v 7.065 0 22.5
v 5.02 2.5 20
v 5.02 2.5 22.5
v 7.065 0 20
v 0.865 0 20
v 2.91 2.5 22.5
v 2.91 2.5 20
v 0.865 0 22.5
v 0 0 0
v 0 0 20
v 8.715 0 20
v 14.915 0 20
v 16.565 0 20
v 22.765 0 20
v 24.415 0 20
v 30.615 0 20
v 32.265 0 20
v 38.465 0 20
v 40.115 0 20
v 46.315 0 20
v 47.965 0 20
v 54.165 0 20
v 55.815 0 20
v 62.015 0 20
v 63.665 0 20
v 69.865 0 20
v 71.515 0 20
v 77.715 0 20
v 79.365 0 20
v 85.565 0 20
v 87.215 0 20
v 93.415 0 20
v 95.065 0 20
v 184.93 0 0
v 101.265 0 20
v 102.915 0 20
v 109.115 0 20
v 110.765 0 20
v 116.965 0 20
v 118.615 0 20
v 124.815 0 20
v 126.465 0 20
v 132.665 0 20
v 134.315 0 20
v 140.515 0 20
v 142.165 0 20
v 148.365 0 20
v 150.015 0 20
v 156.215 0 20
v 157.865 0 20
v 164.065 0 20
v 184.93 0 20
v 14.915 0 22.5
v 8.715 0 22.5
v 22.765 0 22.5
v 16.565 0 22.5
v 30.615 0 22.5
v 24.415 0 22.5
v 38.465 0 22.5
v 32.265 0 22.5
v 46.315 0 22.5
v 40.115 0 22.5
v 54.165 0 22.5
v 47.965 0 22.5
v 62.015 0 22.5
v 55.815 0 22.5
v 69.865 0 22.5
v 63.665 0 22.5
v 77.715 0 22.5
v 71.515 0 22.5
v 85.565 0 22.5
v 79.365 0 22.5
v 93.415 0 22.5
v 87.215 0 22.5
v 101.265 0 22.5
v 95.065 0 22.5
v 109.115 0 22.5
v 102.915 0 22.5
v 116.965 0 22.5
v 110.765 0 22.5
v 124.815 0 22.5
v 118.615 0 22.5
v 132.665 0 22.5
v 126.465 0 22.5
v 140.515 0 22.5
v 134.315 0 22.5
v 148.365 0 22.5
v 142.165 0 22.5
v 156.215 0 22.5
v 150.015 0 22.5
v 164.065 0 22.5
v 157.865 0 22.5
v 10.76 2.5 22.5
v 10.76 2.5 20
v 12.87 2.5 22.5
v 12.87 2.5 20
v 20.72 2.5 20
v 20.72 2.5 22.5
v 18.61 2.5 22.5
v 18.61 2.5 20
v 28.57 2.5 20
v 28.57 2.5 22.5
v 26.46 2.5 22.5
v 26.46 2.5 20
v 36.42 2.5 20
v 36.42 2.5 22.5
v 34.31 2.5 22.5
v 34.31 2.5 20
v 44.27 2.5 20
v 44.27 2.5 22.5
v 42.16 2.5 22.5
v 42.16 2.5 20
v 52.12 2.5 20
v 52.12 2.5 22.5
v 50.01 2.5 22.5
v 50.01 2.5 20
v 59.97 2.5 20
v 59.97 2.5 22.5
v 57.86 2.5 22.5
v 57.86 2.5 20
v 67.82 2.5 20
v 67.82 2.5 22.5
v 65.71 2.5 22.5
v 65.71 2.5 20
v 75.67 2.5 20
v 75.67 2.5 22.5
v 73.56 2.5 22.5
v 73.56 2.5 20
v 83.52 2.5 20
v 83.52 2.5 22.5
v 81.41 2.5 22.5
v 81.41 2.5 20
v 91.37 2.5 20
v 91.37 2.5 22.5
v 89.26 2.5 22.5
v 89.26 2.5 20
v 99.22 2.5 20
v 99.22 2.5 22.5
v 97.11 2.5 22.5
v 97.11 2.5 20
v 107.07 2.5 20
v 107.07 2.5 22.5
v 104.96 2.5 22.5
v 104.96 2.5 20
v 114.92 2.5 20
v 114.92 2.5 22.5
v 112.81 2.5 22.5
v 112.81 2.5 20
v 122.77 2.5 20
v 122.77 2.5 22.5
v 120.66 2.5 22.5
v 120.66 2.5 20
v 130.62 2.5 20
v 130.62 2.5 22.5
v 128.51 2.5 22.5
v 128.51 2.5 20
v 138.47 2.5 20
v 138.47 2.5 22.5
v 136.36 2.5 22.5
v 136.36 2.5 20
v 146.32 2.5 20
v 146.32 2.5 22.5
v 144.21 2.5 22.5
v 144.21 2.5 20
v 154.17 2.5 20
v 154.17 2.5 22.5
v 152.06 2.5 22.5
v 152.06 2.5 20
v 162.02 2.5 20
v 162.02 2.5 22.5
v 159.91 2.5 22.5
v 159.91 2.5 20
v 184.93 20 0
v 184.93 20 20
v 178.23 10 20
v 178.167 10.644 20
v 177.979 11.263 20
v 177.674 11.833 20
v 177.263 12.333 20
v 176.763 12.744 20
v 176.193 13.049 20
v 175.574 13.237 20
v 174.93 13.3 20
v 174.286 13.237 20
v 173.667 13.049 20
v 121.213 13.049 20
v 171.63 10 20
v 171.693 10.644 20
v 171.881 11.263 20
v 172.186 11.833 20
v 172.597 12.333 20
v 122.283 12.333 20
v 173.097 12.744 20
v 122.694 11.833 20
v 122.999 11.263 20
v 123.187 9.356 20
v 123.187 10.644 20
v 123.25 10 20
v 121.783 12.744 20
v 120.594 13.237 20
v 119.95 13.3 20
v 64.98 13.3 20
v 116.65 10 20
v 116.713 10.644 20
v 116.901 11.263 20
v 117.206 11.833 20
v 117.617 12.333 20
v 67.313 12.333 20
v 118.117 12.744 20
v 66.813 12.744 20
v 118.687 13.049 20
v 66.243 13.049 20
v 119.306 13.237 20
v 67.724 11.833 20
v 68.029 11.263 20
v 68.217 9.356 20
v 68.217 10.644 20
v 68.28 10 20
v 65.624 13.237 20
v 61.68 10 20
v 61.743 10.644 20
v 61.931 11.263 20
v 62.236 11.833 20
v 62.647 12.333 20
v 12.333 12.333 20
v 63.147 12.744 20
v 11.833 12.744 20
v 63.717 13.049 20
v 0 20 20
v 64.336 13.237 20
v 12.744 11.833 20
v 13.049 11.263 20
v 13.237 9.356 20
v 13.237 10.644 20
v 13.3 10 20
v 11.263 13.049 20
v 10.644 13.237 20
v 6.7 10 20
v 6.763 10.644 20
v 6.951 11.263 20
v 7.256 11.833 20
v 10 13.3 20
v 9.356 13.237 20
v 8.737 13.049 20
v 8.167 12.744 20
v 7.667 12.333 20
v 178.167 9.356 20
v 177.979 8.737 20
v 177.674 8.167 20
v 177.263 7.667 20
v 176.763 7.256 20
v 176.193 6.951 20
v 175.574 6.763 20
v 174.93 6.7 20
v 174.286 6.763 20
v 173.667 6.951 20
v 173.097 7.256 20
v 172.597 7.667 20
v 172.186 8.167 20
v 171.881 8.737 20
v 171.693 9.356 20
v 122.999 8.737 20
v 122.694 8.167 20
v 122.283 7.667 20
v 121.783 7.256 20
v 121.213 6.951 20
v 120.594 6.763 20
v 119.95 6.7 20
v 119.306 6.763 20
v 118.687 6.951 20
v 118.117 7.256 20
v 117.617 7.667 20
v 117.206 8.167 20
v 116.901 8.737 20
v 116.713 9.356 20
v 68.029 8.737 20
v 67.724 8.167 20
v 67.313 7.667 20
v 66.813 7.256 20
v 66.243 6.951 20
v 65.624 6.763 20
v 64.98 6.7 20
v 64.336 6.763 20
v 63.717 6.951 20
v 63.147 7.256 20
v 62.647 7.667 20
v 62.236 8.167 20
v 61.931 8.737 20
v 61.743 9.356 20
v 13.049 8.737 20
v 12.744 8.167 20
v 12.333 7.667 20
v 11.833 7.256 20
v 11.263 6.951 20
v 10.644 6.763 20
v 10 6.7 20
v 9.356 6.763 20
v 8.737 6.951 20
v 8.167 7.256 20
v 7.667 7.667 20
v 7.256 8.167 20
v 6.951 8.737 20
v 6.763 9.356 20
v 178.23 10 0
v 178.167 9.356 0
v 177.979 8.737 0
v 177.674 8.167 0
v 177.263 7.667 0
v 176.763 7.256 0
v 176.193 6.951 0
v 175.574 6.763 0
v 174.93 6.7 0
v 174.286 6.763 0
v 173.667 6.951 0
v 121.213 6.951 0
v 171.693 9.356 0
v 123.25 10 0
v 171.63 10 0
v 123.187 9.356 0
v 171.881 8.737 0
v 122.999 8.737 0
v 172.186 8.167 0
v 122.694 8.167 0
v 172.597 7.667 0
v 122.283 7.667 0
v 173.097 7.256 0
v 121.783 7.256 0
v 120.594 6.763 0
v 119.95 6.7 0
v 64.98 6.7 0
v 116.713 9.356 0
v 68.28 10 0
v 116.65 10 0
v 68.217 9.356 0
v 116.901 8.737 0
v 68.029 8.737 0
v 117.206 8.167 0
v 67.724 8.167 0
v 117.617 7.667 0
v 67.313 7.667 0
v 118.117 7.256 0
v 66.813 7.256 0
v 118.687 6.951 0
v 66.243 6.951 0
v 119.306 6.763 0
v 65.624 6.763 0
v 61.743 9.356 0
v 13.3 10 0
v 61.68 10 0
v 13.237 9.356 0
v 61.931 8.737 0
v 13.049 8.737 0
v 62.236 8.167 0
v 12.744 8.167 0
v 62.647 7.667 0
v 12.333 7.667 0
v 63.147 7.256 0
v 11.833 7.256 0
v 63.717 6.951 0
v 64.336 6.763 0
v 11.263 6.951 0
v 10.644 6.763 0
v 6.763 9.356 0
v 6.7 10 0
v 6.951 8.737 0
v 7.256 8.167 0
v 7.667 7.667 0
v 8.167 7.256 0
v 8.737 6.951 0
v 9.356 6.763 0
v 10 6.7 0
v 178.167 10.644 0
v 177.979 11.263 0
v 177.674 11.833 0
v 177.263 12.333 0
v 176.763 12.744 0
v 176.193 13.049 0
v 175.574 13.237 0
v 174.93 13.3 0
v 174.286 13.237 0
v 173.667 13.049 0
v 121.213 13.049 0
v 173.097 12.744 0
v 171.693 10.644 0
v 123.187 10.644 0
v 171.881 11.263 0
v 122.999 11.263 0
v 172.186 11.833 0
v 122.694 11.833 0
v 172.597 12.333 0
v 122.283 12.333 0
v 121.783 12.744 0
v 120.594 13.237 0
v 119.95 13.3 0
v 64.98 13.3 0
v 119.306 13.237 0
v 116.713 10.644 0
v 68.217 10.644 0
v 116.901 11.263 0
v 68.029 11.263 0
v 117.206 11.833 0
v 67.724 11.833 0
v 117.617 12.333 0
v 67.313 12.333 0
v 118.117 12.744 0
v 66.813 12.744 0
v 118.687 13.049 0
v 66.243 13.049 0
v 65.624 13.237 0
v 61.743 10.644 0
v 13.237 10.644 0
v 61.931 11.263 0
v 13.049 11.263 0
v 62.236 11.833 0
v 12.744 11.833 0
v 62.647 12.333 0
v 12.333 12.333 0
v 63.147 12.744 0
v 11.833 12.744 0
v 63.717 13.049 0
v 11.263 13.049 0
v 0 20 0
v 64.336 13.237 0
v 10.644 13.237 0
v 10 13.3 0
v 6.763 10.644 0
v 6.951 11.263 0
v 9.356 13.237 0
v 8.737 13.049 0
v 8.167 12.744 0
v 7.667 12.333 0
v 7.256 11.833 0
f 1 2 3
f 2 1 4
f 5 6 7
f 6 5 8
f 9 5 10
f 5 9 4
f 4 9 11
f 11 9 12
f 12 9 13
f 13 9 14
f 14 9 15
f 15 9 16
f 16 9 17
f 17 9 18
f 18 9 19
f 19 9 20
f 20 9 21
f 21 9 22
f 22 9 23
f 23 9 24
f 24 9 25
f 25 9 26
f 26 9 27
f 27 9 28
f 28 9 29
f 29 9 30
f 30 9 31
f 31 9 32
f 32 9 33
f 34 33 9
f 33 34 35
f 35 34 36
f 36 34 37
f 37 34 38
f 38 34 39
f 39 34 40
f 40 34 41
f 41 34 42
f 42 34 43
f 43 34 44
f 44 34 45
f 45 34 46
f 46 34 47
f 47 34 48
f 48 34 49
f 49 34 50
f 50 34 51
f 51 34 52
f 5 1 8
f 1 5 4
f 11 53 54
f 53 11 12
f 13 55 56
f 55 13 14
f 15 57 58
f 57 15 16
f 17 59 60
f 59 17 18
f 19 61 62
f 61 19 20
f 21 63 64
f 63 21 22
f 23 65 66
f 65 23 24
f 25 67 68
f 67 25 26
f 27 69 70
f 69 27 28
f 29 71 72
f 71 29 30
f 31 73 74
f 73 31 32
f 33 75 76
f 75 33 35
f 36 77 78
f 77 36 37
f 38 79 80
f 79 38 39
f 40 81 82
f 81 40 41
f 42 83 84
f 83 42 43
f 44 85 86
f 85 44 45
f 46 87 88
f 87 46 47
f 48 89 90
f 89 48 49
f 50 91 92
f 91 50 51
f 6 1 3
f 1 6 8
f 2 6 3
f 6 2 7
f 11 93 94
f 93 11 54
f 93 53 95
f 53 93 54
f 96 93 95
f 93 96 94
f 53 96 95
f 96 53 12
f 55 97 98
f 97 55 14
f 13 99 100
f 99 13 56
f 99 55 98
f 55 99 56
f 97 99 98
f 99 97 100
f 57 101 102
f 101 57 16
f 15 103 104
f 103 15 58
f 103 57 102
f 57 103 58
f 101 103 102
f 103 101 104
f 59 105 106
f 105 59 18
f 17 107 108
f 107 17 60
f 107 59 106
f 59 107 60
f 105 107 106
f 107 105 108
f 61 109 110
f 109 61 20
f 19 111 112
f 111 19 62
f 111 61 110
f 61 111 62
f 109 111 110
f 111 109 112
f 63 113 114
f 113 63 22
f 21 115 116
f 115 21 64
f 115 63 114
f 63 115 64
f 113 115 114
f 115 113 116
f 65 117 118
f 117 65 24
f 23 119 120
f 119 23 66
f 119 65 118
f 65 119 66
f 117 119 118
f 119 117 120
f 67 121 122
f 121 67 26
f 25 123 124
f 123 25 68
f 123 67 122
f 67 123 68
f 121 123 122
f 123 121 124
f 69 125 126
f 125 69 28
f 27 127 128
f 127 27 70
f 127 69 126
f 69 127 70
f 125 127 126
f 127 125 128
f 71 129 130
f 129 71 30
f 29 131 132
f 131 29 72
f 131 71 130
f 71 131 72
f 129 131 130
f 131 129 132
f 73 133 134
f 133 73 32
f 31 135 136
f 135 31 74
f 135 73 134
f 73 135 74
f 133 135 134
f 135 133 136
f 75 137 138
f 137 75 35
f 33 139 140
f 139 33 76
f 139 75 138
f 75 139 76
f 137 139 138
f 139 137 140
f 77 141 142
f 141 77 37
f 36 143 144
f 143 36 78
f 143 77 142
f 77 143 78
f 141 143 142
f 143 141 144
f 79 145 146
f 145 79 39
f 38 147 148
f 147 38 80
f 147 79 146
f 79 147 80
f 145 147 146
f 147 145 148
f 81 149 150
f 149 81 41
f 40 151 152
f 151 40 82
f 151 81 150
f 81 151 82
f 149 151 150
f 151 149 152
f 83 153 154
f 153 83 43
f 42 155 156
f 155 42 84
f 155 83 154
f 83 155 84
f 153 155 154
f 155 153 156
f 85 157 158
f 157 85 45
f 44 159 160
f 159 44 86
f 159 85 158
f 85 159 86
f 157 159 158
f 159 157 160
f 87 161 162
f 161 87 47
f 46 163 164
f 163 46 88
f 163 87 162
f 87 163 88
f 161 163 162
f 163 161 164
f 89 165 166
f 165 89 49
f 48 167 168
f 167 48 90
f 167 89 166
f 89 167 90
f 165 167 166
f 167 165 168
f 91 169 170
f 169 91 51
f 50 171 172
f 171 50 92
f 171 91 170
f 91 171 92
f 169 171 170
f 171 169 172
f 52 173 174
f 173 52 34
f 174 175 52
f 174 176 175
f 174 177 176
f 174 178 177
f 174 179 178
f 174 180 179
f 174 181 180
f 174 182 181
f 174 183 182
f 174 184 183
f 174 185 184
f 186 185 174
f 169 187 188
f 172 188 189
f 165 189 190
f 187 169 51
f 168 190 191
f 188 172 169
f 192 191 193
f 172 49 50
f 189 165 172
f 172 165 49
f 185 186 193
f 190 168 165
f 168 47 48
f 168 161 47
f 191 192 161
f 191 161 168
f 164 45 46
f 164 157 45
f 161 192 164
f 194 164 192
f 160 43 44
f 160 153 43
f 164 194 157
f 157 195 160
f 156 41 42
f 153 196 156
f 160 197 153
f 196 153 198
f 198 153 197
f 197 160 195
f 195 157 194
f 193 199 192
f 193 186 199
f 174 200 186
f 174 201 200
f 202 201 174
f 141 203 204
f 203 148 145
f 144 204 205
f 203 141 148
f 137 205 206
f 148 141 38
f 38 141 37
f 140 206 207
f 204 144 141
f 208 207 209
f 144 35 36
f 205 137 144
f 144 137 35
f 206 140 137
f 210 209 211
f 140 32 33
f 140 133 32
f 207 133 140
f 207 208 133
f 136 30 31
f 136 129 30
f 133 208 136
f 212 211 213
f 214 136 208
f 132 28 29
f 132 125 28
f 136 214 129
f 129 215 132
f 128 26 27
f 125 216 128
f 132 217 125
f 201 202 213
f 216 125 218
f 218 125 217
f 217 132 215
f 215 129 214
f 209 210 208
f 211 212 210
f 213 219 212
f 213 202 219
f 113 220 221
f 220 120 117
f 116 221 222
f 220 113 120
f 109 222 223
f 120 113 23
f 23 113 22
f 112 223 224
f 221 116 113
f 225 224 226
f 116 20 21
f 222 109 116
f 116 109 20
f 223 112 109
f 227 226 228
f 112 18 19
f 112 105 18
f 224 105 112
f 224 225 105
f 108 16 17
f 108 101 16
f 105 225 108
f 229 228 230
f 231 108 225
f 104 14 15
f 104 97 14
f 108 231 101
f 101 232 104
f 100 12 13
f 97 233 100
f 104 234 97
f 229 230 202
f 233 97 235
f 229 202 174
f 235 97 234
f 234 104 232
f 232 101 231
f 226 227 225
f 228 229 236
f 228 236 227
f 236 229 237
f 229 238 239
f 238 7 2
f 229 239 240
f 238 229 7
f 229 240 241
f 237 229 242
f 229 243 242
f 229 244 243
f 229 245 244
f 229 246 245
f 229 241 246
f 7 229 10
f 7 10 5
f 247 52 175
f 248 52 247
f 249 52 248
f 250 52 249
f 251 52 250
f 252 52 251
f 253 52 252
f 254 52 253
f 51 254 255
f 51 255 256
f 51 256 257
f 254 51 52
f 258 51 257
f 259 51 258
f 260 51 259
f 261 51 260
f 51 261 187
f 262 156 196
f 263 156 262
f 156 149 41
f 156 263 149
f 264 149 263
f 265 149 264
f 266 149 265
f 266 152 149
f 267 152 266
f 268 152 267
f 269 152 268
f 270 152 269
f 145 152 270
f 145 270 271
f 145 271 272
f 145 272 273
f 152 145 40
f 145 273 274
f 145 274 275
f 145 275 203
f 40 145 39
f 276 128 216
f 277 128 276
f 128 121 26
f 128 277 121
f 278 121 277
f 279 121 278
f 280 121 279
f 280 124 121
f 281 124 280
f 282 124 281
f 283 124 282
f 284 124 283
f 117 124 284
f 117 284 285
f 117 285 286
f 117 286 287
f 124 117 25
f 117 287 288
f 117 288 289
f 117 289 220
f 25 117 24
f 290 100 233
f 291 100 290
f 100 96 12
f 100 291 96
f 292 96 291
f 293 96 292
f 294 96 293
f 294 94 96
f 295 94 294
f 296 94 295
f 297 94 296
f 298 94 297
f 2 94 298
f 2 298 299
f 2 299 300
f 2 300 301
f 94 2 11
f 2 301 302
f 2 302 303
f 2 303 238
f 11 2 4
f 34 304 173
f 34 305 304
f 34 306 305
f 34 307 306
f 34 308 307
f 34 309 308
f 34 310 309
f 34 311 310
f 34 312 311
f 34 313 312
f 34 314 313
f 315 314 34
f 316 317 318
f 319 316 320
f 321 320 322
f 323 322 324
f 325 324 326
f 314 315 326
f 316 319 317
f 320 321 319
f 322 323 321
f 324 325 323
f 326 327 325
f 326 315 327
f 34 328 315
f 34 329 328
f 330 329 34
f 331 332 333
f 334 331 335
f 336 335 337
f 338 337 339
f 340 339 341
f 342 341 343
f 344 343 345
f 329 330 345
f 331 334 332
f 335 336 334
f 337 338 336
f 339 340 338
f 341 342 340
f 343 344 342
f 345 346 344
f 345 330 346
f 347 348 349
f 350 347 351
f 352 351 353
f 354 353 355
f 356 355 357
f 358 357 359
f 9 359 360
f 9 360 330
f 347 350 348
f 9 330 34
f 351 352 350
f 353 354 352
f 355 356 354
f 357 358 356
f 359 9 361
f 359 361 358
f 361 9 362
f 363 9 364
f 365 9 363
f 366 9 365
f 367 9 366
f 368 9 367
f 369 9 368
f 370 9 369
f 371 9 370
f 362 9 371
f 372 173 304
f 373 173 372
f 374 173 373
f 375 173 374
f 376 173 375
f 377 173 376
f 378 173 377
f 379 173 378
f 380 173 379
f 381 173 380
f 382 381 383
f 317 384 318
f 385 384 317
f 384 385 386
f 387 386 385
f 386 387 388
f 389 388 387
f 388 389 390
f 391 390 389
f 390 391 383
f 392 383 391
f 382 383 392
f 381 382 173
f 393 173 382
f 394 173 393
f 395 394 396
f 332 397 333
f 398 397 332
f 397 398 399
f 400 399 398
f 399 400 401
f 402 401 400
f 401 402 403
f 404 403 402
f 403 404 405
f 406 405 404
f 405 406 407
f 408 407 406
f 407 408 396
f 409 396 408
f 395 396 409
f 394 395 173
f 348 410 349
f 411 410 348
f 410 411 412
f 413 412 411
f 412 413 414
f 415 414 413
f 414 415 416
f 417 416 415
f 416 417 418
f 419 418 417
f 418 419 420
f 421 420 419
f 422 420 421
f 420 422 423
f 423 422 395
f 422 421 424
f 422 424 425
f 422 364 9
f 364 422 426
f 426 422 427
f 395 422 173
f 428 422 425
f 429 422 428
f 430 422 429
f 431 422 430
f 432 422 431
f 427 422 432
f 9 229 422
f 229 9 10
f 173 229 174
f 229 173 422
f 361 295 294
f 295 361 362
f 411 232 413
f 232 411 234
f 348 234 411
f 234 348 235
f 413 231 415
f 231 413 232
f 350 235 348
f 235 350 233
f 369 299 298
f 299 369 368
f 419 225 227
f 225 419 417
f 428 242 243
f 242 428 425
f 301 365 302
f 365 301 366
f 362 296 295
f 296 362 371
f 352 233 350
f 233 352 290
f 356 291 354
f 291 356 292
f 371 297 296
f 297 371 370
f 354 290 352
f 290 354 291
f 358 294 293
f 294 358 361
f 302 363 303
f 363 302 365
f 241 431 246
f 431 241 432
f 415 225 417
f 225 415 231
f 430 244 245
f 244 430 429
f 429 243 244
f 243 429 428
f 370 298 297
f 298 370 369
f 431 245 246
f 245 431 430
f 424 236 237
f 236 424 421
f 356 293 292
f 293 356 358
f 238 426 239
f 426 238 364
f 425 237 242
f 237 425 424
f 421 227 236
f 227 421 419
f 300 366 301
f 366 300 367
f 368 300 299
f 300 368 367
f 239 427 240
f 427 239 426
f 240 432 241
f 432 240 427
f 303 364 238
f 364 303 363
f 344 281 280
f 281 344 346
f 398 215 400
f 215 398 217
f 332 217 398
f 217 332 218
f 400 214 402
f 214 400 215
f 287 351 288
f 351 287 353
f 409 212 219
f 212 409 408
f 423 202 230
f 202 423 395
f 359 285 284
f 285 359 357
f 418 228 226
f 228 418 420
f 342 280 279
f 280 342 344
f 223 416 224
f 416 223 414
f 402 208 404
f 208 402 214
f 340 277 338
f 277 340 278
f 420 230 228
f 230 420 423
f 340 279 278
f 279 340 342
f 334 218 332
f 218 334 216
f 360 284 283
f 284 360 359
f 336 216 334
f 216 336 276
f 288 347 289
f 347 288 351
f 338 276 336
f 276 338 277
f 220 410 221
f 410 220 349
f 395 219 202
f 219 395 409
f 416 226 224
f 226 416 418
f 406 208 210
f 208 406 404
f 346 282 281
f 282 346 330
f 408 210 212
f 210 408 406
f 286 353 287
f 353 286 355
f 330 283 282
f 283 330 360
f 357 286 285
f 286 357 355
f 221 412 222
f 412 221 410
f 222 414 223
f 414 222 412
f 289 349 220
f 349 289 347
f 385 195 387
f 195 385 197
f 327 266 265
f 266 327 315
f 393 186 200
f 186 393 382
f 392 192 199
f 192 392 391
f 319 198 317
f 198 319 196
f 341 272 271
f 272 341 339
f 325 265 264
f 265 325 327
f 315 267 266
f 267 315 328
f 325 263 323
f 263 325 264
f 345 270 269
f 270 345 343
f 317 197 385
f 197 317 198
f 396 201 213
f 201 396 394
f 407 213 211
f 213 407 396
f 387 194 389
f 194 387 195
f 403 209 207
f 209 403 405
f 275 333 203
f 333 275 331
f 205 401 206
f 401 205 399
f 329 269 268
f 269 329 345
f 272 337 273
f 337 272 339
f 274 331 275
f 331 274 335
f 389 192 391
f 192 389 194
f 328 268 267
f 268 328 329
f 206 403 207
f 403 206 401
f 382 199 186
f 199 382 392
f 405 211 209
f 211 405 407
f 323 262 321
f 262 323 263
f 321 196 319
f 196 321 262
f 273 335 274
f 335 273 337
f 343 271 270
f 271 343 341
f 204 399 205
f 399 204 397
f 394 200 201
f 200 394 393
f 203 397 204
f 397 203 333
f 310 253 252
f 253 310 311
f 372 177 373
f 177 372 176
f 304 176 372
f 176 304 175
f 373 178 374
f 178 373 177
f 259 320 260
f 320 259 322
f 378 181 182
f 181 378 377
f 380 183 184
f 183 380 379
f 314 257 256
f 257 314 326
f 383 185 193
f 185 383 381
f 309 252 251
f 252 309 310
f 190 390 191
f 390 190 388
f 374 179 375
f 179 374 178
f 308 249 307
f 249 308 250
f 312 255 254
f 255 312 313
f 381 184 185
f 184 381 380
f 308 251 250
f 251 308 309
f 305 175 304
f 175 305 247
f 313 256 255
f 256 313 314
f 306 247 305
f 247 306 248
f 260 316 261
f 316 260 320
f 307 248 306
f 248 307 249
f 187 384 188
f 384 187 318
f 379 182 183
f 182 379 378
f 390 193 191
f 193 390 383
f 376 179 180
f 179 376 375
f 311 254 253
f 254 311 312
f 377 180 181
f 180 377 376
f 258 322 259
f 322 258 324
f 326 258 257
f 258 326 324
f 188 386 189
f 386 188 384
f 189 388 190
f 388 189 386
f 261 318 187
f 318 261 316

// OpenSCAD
$fn = 32;

// ----------------------------------------------------------------------
// Gear rack: m=2.5 z=21, 184.93 x 20 x 22.5 mm
// ----------------------------------------------------------------------

// --- parameters (mm) ---
rack_len = 184.93;        // rack length, X
rack_w = 20;              // rack width, Y
rack_h = 22.5;            // overall height, Z
modul = 2.5;              // module
body_t = 20;              // tooth root line height
pitch = 7.85;             // circular pitch
tip_w = 2.11;             // tooth thickness at the tip
root_w = 6.2;             // tooth thickness at the root line
hole_d = 6.6;             // mounting hole
sink = 0.6;               // tooth root overlap into the body

tooth_span = 164.93;

module tooth(x0) {
  /* 20 deg flank profile, sunk into the body for a positive overlap */
  translate([x0, 0, body_t - sink])
    linear_extrude(height = rack_h - body_t + sink)
      polygon(points = [[-root_w / 2, 0], [root_w / 2, 0],
                        [tip_w / 2, rack_h - body_t],
                        [-tip_w / 2, rack_h - body_t]]);
}

difference() {
  union() {
    cube([rack_len, rack_w, body_t]);
    for (i = [0 : 21 - 1])
      tooth((i + 0.5) * pitch + (tooth_span - 21 * pitch) / 2);
  }
  translate([10, 10, -1]) cylinder(h = body_t + 2, d = hole_d);
  translate([64.98, 10, -1]) cylinder(h = body_t + 2, d = hole_d);
  translate([119.95, 10, -1]) cylinder(h = body_t + 2, d = hole_d);
  translate([174.93, 10, -1]) cylinder(h = body_t + 2, d = hole_d);
}
